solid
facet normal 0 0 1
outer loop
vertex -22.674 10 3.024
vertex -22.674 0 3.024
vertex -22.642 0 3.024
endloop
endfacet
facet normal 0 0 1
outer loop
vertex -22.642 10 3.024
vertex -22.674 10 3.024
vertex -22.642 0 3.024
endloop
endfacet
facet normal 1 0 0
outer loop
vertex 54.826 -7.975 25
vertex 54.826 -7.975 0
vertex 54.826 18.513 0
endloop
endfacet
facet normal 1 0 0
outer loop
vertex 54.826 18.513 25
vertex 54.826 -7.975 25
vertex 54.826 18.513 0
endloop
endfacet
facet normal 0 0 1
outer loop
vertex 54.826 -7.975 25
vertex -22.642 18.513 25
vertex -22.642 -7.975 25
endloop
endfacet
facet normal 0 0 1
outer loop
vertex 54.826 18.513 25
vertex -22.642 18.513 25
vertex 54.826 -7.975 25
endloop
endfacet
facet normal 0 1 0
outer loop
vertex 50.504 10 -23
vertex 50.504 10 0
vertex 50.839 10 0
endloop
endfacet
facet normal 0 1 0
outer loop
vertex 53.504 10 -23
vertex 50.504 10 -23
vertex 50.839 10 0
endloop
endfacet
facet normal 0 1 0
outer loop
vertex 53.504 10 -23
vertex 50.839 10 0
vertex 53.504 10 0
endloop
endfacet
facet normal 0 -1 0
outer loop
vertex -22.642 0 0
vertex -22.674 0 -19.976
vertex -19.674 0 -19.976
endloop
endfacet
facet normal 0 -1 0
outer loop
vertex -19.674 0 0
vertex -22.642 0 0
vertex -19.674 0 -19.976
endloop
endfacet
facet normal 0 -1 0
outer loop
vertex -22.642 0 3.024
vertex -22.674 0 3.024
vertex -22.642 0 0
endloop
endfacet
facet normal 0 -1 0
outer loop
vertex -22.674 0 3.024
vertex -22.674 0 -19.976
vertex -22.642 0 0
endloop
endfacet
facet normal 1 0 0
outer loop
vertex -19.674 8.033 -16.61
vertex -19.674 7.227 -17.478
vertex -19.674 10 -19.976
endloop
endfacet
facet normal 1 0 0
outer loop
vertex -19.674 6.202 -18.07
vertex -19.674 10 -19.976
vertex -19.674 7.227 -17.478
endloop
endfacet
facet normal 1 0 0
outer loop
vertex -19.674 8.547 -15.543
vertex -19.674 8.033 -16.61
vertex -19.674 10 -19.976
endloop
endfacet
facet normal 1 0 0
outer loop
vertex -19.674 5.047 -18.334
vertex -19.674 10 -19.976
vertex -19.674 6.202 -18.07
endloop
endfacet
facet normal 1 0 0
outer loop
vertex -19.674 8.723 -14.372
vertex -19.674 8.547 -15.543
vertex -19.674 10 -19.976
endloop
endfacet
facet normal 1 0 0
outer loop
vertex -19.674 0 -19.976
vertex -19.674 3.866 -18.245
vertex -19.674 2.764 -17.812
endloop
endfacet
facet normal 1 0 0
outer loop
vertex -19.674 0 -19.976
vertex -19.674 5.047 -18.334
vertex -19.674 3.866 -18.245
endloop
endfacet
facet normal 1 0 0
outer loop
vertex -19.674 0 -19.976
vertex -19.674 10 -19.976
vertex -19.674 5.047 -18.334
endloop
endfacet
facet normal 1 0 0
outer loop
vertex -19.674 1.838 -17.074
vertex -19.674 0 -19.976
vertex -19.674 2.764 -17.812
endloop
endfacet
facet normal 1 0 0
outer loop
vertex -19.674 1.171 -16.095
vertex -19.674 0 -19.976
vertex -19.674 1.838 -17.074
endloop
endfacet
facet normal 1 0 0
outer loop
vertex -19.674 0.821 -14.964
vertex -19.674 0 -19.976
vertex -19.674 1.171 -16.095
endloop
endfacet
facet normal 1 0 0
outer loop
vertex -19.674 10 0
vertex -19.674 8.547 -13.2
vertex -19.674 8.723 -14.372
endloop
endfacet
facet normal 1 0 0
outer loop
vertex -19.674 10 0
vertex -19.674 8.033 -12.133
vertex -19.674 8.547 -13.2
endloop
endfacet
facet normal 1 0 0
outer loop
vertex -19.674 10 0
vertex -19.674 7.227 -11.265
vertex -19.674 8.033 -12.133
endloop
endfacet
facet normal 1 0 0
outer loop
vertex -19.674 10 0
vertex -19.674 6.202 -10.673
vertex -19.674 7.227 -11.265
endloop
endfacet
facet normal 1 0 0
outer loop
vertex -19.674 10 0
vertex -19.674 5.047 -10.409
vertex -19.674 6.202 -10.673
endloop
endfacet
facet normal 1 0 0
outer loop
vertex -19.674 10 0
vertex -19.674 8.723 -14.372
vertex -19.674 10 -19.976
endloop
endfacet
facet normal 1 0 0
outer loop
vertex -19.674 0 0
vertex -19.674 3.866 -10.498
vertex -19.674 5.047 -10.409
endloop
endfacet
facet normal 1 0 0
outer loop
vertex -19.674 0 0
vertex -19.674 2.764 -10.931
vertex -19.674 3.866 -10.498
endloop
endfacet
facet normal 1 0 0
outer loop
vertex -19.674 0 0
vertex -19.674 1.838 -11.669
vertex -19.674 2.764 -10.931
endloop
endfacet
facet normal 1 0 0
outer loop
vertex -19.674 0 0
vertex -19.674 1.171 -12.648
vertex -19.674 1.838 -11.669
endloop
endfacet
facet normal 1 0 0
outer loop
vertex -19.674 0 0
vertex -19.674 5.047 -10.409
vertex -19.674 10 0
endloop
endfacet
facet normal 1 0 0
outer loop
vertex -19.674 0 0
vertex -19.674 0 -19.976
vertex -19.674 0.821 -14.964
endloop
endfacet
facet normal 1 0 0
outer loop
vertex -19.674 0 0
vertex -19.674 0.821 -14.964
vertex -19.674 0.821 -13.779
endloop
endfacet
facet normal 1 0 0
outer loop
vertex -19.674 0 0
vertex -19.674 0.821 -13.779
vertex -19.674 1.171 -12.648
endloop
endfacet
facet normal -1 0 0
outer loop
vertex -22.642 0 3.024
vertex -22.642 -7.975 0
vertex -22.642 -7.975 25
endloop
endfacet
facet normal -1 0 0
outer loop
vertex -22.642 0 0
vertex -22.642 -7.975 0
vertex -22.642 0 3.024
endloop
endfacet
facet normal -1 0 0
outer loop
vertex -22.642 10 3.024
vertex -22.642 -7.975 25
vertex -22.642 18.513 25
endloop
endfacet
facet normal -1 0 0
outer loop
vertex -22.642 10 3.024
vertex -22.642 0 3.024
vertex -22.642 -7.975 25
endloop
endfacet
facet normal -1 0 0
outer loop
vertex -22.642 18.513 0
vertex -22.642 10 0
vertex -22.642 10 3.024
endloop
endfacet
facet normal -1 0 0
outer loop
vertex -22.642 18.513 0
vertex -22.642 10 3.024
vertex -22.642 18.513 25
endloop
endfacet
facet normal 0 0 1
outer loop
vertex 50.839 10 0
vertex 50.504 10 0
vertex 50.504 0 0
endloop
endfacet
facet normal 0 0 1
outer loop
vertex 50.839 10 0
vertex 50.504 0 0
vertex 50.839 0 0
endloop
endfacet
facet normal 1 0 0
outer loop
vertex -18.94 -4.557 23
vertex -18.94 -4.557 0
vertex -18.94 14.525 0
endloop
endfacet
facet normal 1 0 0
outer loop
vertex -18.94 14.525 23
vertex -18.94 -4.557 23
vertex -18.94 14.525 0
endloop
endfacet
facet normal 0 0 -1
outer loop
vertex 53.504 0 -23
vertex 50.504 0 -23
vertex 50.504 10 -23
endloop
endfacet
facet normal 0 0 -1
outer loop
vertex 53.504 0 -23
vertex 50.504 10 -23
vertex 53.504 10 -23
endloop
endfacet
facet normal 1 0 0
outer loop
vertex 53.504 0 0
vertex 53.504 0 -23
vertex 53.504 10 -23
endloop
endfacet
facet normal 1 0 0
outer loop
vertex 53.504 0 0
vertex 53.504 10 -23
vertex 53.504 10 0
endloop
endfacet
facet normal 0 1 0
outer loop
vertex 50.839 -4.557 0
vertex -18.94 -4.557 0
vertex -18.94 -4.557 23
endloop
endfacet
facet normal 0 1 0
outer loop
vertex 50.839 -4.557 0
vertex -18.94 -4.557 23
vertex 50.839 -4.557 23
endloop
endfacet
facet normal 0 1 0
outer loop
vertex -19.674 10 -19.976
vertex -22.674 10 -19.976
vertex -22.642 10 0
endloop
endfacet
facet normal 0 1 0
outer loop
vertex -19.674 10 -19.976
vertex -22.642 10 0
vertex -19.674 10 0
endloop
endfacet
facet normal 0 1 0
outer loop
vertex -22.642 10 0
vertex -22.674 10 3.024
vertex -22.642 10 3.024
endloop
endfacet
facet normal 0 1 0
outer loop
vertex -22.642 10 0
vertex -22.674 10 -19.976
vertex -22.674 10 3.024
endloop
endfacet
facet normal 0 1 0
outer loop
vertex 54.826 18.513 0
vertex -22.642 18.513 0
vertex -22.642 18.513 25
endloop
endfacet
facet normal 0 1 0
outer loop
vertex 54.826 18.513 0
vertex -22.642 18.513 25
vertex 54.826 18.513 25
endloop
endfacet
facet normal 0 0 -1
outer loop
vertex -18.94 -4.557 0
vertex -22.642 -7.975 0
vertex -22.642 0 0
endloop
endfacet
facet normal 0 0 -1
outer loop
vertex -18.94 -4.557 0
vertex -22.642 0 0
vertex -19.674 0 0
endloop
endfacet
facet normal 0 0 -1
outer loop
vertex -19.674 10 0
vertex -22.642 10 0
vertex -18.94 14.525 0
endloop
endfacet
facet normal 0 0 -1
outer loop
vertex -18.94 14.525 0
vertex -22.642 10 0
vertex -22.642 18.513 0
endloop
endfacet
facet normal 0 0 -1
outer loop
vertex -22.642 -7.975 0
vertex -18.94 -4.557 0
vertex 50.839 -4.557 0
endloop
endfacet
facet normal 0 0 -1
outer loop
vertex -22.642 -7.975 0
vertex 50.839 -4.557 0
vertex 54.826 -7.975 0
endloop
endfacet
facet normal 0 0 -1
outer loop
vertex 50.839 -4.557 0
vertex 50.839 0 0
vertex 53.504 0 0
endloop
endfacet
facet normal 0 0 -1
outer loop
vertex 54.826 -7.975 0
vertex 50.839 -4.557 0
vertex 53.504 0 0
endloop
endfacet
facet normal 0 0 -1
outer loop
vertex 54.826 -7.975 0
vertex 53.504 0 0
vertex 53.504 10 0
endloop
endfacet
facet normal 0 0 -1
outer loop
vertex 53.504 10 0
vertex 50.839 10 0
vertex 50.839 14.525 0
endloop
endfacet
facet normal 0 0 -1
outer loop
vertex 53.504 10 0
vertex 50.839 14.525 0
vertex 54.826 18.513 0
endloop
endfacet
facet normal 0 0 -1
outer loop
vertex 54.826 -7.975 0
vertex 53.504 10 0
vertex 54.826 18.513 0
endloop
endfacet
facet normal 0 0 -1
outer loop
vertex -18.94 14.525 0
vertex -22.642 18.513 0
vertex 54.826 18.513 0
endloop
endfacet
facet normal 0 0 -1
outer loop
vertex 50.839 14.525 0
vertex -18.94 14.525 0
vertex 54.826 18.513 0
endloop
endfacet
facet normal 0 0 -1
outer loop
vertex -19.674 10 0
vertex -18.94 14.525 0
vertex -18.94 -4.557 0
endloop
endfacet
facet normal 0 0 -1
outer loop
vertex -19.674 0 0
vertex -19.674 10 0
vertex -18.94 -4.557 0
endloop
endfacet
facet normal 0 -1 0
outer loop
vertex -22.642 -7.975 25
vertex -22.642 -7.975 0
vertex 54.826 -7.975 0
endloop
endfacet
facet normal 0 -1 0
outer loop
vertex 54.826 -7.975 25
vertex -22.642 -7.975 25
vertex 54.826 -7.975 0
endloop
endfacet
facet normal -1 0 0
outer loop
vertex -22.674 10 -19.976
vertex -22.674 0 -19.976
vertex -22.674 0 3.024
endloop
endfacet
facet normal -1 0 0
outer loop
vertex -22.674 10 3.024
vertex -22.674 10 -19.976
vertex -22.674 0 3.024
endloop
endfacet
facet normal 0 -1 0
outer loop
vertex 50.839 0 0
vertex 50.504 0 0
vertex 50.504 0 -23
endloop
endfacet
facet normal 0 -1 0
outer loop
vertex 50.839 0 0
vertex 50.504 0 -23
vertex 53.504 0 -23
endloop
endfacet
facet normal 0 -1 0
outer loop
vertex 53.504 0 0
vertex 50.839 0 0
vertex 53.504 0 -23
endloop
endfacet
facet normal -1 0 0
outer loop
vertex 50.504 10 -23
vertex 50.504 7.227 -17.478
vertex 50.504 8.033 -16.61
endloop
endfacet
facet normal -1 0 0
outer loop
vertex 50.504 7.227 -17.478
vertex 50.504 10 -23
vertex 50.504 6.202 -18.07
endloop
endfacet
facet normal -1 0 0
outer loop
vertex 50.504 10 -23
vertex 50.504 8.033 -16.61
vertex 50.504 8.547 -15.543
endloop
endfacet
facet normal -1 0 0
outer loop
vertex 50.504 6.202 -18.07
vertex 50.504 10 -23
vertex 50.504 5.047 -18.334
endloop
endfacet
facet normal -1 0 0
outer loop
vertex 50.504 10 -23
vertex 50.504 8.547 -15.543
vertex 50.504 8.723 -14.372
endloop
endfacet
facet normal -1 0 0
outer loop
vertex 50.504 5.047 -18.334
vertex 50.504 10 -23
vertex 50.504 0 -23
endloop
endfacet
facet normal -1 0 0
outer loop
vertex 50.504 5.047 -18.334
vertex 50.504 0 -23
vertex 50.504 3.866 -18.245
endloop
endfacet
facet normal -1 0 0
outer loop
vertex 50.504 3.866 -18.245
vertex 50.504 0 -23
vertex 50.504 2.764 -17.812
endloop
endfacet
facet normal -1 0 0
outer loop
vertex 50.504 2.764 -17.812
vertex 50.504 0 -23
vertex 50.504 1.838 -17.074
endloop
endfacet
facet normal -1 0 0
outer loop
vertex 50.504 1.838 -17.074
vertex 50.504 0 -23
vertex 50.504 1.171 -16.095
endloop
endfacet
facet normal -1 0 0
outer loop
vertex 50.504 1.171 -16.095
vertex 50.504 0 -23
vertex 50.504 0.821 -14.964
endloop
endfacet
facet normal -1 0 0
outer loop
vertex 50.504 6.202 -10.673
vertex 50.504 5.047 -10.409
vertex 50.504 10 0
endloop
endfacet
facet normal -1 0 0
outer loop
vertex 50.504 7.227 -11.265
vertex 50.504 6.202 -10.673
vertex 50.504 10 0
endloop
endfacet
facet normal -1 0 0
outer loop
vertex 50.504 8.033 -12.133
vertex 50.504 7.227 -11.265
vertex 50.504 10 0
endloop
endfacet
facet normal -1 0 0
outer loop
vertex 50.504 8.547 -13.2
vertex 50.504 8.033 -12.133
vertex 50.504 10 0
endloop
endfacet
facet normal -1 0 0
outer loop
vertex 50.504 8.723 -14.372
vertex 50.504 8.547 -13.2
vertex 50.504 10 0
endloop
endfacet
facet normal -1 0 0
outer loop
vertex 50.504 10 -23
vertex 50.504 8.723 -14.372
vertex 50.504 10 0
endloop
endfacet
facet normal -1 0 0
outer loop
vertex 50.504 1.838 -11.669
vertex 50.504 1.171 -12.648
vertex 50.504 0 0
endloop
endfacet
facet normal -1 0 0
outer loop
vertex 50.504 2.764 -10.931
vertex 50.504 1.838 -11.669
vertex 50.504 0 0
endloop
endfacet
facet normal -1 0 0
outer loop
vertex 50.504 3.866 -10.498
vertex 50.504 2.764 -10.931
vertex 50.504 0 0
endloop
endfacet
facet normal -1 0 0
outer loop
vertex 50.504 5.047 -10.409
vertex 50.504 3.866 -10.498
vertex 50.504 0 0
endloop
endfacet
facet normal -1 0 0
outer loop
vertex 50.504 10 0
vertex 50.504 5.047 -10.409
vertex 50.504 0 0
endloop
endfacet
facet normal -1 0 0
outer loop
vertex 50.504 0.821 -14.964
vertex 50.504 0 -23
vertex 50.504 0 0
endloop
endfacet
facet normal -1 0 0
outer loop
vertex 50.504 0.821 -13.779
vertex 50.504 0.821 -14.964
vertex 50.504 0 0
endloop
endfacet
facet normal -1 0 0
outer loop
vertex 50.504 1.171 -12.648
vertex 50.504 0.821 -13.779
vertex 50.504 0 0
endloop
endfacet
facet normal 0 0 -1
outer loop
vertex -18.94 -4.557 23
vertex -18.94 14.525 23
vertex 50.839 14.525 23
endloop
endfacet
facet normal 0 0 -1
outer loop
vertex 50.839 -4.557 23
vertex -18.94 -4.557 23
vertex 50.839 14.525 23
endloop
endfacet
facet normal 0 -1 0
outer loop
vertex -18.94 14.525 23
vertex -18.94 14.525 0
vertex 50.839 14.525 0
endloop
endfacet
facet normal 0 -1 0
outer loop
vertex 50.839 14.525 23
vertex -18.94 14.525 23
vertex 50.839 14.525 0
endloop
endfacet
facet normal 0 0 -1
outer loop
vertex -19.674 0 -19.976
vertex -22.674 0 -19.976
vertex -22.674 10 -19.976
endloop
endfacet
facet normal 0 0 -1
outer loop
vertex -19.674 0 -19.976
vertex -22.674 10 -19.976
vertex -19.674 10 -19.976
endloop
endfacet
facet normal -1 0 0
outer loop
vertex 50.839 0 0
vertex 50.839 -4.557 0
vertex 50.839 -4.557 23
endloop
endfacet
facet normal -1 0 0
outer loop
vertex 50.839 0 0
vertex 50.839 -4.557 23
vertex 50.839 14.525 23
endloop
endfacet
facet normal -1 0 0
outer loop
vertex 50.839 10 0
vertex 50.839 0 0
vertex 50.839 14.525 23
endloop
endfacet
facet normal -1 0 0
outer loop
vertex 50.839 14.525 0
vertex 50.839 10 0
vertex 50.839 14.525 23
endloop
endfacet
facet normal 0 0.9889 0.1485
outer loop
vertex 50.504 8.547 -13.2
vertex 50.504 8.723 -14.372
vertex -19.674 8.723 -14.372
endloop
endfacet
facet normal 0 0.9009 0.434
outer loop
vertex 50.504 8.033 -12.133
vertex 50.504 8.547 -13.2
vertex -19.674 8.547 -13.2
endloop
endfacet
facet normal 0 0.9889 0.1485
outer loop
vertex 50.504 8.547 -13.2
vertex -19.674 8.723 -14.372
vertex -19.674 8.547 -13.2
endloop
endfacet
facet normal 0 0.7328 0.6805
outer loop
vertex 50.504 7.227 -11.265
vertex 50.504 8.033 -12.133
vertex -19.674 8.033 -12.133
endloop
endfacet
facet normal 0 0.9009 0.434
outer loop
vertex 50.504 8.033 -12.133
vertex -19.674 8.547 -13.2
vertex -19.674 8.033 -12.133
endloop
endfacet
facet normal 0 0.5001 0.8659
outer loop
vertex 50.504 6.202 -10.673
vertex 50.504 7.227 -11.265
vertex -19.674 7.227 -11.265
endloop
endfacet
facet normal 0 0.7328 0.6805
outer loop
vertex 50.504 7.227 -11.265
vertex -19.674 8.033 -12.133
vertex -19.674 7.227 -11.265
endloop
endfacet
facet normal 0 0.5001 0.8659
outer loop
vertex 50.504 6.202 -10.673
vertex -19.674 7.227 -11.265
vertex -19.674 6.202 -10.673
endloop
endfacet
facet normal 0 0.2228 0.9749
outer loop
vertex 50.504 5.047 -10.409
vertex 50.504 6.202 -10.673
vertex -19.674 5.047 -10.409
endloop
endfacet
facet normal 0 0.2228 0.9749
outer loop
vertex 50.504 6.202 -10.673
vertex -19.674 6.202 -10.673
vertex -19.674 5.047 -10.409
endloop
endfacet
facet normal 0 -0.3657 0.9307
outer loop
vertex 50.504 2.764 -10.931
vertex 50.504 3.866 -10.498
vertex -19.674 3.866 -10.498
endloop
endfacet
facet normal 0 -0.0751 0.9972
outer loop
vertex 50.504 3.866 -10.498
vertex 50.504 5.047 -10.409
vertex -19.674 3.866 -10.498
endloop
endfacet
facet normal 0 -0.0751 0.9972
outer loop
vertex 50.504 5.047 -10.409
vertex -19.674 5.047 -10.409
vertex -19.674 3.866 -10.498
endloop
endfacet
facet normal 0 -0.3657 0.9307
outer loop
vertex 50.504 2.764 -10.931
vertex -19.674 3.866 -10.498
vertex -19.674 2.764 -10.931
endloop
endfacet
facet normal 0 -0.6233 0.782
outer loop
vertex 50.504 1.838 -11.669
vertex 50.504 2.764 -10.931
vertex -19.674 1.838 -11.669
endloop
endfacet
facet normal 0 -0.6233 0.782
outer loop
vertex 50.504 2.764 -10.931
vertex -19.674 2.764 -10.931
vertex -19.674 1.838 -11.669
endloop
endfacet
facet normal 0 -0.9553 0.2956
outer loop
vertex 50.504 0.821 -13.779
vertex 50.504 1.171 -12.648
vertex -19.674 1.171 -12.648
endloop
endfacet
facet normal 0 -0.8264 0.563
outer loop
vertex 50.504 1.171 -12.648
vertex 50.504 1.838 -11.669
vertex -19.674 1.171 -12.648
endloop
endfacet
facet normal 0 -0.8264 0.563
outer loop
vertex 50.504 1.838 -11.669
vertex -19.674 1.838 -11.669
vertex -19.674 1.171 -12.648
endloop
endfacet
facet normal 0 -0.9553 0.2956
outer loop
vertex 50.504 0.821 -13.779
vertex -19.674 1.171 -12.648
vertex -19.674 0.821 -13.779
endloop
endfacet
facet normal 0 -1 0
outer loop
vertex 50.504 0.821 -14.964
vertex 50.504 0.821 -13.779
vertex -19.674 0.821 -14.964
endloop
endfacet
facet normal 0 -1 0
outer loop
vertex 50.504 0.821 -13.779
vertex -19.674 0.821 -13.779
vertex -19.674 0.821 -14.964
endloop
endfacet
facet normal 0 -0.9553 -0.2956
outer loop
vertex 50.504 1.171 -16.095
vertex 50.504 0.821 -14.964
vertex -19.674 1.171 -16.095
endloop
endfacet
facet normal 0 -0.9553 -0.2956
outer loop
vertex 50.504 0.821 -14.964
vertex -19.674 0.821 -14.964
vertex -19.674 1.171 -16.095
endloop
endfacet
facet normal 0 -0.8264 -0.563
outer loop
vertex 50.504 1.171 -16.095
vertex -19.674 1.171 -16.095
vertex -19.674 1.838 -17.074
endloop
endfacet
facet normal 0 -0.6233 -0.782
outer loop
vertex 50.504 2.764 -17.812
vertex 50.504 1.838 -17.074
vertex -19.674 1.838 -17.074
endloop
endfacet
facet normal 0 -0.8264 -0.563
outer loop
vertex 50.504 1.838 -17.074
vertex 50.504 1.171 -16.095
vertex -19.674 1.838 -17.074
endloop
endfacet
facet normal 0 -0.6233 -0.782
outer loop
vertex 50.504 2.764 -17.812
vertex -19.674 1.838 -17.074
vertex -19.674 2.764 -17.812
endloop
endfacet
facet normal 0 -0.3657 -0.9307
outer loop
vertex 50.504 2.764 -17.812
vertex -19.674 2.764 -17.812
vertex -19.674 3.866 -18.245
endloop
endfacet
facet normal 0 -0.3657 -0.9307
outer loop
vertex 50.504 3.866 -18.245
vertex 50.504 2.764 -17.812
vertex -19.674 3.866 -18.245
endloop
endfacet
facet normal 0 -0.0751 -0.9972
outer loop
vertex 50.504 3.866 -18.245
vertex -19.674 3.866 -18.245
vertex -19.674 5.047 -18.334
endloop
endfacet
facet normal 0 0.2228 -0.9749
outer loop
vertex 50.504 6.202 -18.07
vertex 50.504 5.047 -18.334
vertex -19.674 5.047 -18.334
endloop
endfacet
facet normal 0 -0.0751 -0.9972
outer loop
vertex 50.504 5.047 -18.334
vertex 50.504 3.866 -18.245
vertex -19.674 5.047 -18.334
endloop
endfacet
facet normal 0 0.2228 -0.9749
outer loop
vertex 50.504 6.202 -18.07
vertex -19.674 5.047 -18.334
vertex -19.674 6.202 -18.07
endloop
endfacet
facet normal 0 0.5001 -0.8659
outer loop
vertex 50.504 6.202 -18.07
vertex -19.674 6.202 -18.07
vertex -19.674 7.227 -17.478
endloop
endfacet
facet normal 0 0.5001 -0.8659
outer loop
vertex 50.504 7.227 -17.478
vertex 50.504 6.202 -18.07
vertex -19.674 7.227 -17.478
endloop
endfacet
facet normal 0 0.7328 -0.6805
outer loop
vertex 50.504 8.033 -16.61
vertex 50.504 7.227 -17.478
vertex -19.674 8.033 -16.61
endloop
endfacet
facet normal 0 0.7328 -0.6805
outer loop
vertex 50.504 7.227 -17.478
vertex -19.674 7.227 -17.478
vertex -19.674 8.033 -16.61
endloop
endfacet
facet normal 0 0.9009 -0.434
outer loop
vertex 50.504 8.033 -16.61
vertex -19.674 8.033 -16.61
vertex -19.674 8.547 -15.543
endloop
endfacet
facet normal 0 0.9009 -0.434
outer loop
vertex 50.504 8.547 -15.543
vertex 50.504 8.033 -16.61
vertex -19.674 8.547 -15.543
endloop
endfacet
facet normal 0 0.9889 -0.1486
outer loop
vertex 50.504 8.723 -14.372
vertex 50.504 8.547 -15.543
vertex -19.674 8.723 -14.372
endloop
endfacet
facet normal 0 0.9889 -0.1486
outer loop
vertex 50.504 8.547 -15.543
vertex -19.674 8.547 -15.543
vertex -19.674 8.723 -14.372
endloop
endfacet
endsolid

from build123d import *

# Parameters (mm, degrees)
F0_W     = 77.468356
F0_H     = 26.487343
F1_DEPTH = 25
F2_W     = 69.778483
F2_H     = 19.08228
F3_DEPTH = 23
F4_W     = 3
F4_H     = 23
F5_DEPTH = 10
F6_R     = 3.973158
F7_DEPTH = 72


with BuildPart() as f1:
    # F0 (on Top) → F1 (new body)
    with BuildSketch(Plane.XY):
        with Locations((16.091772, 5.268987)):
            Rectangle(F0_W, F0_H)
    extrude(amount=F1_DEPTH)

    # F2 (on Top) → F3 (cut)
    with BuildSketch(Plane.XY):
        with Locations((15.949367, 4.984178)):
            Rectangle(F2_W, F2_H)
    extrude(amount=F3_DEPTH, mode=Mode.SUBTRACT)

    # F4 (on Front) → F5 (join)
    with BuildSketch(Plane.XZ):
        with Locations((-21.174206, -8.476495)):
            Rectangle(F4_W, F4_H)
        with Locations((52.004144, -11.5)):
            Rectangle(F4_W, F4_H)
    extrude(amount=-F5_DEPTH)

    # F6 (on face) → F7 (join)
    with BuildSketch(Plane.YZ.offset(-19.674206)):
        with Locations((4.750193, -14.371534)):
            Circle(F6_R)
    extrude(amount=F7_DEPTH)


solid = f1.part
